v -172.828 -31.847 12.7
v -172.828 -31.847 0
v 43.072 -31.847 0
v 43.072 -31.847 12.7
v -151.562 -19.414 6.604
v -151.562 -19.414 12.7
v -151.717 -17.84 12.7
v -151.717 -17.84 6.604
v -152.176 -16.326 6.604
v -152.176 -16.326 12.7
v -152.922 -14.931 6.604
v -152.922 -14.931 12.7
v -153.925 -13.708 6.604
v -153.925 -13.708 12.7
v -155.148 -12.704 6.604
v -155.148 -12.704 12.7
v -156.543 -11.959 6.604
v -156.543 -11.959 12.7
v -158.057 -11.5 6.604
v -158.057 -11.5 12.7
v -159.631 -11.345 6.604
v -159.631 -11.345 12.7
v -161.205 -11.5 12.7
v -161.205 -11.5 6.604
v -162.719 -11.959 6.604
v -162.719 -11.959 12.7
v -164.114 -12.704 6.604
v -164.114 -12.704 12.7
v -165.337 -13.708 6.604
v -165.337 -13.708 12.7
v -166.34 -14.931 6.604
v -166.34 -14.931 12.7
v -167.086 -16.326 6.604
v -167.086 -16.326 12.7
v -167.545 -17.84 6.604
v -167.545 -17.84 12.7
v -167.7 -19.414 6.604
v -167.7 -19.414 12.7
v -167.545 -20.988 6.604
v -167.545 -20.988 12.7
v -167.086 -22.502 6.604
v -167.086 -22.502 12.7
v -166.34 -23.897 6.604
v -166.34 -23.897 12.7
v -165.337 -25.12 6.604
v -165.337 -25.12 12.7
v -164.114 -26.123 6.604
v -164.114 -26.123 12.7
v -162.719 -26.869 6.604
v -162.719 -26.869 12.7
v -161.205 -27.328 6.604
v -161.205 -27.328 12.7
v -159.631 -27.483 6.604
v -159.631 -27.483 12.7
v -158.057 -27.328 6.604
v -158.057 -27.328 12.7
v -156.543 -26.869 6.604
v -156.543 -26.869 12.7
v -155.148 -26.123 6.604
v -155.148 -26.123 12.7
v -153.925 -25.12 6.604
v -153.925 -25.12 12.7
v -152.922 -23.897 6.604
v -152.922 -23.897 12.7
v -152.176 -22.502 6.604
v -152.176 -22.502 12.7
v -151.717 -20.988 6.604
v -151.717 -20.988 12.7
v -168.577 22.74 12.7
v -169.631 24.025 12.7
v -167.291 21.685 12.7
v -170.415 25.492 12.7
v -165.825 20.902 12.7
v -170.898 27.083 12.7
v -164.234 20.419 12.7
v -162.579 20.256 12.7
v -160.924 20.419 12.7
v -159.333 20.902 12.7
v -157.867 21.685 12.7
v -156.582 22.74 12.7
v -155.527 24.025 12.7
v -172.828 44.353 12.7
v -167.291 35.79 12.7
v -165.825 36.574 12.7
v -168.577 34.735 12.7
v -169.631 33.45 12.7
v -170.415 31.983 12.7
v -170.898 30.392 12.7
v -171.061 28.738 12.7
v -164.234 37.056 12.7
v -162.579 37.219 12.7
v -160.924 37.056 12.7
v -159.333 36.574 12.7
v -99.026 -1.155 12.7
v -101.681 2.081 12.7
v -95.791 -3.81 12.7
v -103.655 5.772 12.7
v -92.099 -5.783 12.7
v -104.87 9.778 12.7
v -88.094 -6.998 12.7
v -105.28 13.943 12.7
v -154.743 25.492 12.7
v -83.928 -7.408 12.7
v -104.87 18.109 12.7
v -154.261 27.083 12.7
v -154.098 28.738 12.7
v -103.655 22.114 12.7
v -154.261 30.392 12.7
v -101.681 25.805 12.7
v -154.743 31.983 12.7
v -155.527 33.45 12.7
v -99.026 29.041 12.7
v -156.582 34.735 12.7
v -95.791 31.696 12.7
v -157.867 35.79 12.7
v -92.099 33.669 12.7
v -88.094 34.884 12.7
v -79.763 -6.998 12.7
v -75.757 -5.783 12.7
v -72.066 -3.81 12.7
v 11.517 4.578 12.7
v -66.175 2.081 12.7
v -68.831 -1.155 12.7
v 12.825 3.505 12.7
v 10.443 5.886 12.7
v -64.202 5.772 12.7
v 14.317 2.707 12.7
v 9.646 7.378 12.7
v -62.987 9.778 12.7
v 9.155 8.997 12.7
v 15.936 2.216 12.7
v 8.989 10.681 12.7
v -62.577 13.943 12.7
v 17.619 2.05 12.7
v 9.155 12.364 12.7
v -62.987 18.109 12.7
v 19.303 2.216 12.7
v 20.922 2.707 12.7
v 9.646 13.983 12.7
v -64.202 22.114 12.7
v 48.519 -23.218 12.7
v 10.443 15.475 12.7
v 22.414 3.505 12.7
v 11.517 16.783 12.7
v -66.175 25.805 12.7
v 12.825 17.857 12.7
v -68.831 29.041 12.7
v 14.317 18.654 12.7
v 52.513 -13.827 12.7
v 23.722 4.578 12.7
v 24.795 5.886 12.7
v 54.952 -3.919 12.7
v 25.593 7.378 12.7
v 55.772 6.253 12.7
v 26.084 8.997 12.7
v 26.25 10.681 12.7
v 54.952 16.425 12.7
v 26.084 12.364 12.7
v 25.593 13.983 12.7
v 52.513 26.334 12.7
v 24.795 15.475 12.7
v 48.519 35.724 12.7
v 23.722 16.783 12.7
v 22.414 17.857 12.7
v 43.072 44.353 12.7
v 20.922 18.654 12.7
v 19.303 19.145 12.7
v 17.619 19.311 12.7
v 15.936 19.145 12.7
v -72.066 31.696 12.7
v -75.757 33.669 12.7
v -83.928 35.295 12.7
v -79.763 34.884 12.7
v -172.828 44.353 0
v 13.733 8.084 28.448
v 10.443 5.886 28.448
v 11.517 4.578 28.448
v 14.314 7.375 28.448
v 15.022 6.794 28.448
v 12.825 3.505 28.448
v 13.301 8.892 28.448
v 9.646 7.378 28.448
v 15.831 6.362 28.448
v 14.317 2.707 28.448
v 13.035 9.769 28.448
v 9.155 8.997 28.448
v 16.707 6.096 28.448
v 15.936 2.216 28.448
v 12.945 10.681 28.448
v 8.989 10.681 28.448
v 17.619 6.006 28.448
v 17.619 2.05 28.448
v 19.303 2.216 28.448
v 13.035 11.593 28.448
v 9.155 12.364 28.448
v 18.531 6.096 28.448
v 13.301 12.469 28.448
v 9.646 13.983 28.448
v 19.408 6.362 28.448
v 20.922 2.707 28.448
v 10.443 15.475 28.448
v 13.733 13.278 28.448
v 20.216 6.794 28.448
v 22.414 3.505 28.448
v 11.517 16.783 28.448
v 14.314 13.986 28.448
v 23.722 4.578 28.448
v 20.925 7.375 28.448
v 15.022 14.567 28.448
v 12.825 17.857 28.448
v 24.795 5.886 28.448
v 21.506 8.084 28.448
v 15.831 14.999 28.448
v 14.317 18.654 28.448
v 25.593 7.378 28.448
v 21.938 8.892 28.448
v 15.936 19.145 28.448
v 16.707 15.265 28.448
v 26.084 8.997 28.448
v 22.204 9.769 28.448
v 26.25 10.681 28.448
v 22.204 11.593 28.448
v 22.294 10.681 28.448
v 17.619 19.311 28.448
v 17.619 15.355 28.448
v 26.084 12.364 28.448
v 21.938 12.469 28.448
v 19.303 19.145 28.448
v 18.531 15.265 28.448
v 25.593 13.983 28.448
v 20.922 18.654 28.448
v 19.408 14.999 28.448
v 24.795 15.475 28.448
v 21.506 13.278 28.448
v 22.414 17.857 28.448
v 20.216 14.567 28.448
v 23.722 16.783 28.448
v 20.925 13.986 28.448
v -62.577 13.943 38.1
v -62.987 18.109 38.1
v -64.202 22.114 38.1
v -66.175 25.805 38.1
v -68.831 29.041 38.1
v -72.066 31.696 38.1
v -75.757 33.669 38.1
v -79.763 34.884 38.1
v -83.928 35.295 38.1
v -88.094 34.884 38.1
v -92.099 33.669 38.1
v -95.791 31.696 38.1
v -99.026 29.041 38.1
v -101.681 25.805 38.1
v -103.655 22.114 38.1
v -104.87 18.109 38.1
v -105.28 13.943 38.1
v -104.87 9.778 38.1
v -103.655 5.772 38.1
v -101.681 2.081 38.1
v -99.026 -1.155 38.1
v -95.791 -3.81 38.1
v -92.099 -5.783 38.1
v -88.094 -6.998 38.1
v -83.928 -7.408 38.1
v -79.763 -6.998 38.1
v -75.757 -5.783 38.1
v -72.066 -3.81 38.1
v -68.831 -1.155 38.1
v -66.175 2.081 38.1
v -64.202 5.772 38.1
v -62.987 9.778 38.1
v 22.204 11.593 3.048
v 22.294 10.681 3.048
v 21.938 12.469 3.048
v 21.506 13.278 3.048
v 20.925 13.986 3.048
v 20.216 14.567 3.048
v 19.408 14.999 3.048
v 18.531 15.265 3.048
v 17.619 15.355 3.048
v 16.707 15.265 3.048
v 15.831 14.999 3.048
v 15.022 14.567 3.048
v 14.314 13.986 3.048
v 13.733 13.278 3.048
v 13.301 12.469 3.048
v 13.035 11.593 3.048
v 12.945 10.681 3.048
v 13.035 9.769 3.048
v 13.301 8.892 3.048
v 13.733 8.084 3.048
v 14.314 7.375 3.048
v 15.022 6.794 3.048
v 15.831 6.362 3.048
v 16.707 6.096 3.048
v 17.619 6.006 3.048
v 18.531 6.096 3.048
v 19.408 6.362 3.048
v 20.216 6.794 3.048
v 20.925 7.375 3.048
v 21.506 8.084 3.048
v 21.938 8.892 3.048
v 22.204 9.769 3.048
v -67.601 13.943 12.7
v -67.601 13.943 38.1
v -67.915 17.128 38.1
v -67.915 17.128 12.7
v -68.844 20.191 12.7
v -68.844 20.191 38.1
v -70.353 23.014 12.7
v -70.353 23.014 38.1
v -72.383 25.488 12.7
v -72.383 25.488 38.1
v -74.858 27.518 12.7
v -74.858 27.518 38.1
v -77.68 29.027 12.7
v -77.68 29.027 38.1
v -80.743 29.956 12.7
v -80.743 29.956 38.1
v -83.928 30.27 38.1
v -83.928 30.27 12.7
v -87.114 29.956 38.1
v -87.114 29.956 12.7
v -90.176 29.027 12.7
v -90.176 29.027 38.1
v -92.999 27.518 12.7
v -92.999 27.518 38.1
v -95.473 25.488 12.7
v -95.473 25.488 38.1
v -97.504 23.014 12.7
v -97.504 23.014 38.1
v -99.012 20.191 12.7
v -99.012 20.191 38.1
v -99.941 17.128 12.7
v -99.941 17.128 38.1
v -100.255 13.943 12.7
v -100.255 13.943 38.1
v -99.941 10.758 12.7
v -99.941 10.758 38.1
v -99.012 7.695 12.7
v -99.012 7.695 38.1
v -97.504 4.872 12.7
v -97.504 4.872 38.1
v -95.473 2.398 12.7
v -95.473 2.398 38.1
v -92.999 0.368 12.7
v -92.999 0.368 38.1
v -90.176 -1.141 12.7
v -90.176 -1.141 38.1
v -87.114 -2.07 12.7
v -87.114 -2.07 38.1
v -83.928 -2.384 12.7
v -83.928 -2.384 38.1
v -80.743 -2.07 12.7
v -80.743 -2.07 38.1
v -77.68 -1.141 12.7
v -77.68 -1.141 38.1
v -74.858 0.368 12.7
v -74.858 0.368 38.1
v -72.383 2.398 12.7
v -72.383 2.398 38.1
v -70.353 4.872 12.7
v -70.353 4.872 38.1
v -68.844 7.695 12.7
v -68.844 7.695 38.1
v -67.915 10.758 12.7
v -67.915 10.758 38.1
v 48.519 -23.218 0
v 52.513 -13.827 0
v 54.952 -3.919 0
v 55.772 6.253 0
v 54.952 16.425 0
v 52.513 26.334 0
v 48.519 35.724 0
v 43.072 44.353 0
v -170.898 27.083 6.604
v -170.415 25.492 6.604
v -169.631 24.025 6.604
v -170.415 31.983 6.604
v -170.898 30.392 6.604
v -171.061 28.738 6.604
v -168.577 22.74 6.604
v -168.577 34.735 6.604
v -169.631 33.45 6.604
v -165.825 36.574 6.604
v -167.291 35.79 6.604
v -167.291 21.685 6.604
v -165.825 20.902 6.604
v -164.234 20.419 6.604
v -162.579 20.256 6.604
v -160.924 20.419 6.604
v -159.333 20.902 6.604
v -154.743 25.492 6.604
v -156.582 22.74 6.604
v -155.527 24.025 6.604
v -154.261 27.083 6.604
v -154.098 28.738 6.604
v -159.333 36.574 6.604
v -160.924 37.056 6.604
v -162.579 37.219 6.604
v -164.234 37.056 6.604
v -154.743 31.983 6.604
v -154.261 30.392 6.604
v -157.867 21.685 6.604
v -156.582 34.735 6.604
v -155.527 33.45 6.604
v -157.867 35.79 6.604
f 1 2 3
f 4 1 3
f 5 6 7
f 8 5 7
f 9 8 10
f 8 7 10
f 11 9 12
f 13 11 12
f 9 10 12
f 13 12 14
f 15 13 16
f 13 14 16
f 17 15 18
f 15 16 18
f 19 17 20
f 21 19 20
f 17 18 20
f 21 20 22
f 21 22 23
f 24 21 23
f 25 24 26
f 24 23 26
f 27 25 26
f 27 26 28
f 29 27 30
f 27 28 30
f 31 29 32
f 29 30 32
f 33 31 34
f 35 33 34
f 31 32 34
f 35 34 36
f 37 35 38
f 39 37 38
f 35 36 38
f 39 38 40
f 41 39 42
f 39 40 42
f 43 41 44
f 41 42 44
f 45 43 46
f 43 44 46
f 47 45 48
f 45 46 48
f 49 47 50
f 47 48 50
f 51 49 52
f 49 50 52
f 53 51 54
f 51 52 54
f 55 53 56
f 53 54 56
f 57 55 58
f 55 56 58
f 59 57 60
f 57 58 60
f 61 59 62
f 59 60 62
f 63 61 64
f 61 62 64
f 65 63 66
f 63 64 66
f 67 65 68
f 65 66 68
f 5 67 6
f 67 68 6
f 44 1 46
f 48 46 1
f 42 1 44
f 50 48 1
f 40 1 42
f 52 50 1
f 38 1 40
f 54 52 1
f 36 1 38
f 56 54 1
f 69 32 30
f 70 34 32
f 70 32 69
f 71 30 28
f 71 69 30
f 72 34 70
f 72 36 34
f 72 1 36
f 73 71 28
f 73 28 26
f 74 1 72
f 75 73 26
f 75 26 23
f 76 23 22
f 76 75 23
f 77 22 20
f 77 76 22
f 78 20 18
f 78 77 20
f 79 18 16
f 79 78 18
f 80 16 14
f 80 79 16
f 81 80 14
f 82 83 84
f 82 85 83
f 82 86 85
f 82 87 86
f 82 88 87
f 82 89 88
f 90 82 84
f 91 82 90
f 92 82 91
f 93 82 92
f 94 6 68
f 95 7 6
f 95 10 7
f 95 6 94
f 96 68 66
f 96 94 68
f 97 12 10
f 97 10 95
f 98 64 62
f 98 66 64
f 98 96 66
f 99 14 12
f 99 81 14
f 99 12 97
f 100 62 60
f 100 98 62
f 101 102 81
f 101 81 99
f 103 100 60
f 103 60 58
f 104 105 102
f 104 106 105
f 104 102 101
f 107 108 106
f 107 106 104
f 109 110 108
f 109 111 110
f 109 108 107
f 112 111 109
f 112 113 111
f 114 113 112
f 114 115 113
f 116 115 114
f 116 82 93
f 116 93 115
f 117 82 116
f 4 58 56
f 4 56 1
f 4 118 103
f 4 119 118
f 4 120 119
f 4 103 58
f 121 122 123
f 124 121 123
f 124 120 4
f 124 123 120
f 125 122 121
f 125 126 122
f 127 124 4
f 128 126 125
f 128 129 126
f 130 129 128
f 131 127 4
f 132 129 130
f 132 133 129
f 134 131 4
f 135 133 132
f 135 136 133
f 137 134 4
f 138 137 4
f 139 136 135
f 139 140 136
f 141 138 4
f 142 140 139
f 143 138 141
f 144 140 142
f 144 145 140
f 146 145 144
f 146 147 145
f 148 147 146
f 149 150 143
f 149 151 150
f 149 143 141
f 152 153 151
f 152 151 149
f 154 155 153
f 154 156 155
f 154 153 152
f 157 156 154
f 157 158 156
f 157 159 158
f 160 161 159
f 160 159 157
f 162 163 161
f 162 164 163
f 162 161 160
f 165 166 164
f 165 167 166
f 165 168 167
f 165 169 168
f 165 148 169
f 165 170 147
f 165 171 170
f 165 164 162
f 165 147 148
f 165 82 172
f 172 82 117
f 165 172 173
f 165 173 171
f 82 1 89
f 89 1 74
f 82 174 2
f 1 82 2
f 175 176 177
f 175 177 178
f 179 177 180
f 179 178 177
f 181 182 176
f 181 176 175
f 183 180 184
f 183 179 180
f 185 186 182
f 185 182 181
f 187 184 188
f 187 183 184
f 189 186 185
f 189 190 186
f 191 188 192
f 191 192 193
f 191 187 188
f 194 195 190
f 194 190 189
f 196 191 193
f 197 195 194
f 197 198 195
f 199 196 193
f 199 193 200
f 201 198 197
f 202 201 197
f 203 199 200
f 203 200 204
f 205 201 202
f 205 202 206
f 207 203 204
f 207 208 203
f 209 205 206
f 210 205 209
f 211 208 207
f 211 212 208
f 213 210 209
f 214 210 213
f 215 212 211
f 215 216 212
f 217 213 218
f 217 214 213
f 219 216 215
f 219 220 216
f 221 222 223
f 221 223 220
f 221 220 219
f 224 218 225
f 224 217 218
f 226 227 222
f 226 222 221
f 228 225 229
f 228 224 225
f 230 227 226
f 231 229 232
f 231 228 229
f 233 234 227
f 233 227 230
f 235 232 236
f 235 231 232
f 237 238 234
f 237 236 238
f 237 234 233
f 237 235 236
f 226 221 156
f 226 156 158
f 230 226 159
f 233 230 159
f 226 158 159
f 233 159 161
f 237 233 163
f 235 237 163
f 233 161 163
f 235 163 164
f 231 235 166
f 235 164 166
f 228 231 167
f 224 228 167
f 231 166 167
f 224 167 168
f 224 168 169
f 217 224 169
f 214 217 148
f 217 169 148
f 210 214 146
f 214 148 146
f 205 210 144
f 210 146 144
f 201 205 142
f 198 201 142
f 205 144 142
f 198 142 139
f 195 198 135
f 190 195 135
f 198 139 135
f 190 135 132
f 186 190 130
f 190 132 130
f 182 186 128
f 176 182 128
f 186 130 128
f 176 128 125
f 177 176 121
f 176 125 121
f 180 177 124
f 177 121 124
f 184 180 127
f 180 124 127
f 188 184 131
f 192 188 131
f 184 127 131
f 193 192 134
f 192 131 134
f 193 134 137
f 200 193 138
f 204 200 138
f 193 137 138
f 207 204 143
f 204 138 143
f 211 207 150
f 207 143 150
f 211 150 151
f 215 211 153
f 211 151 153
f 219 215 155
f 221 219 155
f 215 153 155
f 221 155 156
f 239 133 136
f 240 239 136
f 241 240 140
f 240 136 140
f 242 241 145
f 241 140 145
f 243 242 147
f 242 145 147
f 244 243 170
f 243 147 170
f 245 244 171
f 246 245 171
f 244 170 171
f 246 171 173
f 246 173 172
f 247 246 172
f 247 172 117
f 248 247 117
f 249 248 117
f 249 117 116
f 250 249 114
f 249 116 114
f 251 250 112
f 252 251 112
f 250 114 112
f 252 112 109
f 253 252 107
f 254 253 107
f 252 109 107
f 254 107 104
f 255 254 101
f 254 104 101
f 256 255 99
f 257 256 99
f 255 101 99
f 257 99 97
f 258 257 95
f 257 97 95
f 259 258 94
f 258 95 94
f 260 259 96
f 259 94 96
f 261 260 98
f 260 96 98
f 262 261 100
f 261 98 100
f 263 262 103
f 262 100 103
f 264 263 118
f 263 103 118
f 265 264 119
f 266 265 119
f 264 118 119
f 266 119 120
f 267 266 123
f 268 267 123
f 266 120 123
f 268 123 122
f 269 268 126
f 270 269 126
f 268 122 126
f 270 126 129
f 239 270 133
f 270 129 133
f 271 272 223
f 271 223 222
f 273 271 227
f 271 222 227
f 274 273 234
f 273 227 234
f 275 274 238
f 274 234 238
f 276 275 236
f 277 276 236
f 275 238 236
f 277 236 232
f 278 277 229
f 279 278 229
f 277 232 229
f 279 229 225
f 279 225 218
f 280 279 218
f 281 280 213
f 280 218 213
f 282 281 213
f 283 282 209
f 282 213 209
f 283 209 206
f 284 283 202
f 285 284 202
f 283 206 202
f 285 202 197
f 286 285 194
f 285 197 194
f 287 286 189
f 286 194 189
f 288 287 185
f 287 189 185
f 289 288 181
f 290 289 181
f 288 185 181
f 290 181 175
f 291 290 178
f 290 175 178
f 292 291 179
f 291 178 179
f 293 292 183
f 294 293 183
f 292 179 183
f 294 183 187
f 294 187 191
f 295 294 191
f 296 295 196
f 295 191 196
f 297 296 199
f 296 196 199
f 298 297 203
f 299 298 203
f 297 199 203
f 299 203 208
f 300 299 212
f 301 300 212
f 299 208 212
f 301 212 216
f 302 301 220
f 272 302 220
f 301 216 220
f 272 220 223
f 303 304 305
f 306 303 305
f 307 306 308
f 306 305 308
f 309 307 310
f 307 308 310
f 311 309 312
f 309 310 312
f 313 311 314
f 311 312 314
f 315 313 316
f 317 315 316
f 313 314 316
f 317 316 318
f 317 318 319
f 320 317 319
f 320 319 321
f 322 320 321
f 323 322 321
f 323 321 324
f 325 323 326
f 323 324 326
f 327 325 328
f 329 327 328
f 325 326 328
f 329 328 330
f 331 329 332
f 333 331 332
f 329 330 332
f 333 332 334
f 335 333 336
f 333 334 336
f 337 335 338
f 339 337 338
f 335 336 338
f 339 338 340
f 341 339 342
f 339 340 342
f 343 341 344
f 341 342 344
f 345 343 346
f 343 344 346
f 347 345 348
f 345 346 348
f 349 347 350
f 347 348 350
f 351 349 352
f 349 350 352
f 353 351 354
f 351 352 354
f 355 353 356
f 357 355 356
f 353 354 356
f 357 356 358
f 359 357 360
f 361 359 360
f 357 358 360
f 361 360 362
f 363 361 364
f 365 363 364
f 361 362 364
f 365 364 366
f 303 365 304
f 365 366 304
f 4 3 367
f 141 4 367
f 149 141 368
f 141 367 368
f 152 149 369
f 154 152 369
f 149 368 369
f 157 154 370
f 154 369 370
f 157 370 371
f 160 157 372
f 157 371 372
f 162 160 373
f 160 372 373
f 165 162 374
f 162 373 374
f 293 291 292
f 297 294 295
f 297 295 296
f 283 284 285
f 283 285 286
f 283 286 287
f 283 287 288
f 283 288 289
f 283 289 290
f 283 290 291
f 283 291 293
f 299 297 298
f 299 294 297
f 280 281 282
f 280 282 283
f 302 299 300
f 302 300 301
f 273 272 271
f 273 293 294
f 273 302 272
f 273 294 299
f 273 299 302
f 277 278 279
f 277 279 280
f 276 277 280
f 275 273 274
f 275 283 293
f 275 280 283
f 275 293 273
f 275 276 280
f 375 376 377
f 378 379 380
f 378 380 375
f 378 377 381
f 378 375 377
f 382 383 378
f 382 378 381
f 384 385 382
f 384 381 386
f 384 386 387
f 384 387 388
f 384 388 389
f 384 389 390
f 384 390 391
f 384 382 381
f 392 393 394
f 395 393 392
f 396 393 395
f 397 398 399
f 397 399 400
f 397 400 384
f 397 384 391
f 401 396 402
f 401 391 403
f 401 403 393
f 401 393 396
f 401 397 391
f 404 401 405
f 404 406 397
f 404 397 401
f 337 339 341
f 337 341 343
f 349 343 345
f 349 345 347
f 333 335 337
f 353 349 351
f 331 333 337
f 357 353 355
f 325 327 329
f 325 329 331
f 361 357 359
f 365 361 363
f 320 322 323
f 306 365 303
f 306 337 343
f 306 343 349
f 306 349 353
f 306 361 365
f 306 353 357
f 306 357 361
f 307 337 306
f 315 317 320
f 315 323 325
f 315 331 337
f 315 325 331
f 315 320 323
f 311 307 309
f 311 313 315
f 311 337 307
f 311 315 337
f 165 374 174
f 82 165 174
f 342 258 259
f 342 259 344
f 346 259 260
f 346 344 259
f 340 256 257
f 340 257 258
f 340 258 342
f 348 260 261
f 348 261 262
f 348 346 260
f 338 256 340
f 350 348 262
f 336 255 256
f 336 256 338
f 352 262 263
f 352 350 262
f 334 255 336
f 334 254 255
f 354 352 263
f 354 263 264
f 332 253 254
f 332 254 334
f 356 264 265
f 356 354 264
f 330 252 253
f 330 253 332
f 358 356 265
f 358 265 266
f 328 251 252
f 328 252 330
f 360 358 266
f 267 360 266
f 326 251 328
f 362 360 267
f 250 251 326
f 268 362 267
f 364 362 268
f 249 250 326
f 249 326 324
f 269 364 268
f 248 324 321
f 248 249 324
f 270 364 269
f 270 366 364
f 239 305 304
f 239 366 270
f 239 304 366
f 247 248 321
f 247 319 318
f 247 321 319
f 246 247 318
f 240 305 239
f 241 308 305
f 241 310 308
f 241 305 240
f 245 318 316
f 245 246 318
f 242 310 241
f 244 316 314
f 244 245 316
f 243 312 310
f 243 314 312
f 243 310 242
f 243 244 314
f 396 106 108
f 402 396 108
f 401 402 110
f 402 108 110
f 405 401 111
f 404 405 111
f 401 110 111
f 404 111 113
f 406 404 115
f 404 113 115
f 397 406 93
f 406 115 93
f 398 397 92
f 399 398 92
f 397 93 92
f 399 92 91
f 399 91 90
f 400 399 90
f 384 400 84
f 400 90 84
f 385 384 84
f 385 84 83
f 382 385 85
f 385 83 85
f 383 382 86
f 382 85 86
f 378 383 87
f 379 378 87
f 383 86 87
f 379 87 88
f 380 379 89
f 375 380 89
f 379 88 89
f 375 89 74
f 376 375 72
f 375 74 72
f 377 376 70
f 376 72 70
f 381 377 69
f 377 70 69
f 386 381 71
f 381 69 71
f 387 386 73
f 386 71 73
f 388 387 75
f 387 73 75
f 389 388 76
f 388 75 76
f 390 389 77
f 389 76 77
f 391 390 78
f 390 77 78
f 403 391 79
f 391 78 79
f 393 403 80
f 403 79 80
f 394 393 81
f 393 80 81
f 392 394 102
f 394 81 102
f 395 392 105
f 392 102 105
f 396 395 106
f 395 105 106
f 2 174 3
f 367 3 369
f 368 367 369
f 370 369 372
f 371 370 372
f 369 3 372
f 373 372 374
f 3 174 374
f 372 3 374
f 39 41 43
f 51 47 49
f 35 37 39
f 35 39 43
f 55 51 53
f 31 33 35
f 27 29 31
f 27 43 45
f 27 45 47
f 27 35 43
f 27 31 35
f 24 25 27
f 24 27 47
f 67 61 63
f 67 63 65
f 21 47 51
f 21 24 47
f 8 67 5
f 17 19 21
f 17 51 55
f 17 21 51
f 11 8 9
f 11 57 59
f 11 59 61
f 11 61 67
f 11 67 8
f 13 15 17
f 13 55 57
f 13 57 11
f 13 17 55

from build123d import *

# Parameters (mm, degrees)
F1_DEPTH  = 12.7
F2_R      = 21.351508313
F5_DEPTH  = 25.4
F3_R      = 8.6303522865
F6_DEPTH  = 15.748
F7_R      = 16.3268483507
F8_DEPTH  = 25.4
F9_R      = 4.6742871789
F10_DEPTH = 25.4
F12_R     = 8.0691836116
F13_DEPTH = 6.096
F14_R     = 8.4816227384
F15_DEPTH = 6.096
F16_R     = 7.7449040589
F16_R_2   = 7.9980791945
F17_DEPTH = 9.906
F20_DEPTH = 76.2
F22_DEPTH = 54.61


with BuildPart() as f1:
    # F0 (on Top) → F1 (new body)
    with BuildSketch(Plane.XY):
        with BuildLine():
            Line((43.0717023765, 44.353062627), (-172.8282976235, 44.353062627))
            Line((-172.8282976235, 44.353062627), (-172.8282976235, -31.846937373))
            Line((-172.8282976235, -31.846937373), (43.0717023765, -31.846937373))
            ThreePointArc((43.0717023765, -31.846937373), (55.7717023765, 6.253062627), (43.0717023765, 44.353062627))
        make_face()
    extrude(amount=F1_DEPTH)

    # F2 (on face) → F5 (join)
    with BuildSketch(Plane.XY.offset(12.7)):
        with Locations((-83.9282976235, 13.9431571588)):
            Circle(F2_R)
    extrude(amount=F5_DEPTH)

    # F3 (on face) → F6 (join)
    with BuildSketch(Plane.XY.offset(12.7)):
        with Locations((17.6193086471, 10.6806947875)):
            Circle(F3_R)
    extrude(amount=F6_DEPTH)

    # F7 (on face) → F8 (cut)
    with BuildSketch(Plane.XY.offset(38.1)):
        with Locations((-83.9282976235, 13.9431571588)):
            Circle(F7_R)
    extrude(amount=-F8_DEPTH, mode=Mode.SUBTRACT)

    # F9 (on face) → F10 (cut)
    with BuildSketch(Plane.XY.offset(28.448)):
        with Locations((17.6193086471, 10.6806947875)):
            Circle(F9_R)
    extrude(amount=-F10_DEPTH, mode=Mode.SUBTRACT)

    # F12 (on face) → F13 (cut)
    with BuildSketch(Plane.XY.offset(12.7)):
        with Locations((-159.6309095621, -19.4137375802)):
            Circle(F12_R)
    extrude(amount=-F13_DEPTH, mode=Mode.SUBTRACT)

    # F14 (on face) → F15 (cut)
    with BuildSketch(Plane.XY.offset(12.7)):
        with Locations((-162.579163909, 28.7375189364)):
            Circle(F14_R)
    extrude(amount=-F15_DEPTH, mode=Mode.SUBTRACT)

    # F16 (on face) → F17 (join)
    with BuildSketch(Plane.XY.offset(12.7)):
        with Locations((-135.2781951427, 29.6167228371)):
            Circle(F16_R)
        with Locations((-135.2781951427, -19.9670530856)):
            Circle(F16_R_2)
    extrude(amount=-F17_DEPTH)

    # F19 (on face) → F20 (cut)
    with BuildSketch(Plane(origin=(-0.7380402899, 10.8379946946, 0), x_dir=(-0.9976893986, -0.0679401489, 0), z_dir=(-0.0679401489, 0.9976893986, 0))):
        Polygon((-10.0049076565, 30.4591804743), (62.7737756253, 41.8267212808), (62.7737756253, 54.864), (-10.0049076565, 54.864), align=None)
    extrude(amount=F20_DEPTH, mode=Mode.SUBTRACT)

    # F21 (on face) → F22 (cut)
    with BuildSketch(Plane(origin=(1.6560066854, 12.5212517744, 0), x_dir=(0.9913673033, -0.1311139582, 0), z_dir=(-0.1311139582, -0.9913673033, 0))):
        Polygon((7.6538164039, 54.864), (-65.4252028626, 54.864), (7.6538164039, 28.5761542618), align=None)
    extrude(amount=F22_DEPTH, mode=Mode.SUBTRACT)


solid = f1.part
